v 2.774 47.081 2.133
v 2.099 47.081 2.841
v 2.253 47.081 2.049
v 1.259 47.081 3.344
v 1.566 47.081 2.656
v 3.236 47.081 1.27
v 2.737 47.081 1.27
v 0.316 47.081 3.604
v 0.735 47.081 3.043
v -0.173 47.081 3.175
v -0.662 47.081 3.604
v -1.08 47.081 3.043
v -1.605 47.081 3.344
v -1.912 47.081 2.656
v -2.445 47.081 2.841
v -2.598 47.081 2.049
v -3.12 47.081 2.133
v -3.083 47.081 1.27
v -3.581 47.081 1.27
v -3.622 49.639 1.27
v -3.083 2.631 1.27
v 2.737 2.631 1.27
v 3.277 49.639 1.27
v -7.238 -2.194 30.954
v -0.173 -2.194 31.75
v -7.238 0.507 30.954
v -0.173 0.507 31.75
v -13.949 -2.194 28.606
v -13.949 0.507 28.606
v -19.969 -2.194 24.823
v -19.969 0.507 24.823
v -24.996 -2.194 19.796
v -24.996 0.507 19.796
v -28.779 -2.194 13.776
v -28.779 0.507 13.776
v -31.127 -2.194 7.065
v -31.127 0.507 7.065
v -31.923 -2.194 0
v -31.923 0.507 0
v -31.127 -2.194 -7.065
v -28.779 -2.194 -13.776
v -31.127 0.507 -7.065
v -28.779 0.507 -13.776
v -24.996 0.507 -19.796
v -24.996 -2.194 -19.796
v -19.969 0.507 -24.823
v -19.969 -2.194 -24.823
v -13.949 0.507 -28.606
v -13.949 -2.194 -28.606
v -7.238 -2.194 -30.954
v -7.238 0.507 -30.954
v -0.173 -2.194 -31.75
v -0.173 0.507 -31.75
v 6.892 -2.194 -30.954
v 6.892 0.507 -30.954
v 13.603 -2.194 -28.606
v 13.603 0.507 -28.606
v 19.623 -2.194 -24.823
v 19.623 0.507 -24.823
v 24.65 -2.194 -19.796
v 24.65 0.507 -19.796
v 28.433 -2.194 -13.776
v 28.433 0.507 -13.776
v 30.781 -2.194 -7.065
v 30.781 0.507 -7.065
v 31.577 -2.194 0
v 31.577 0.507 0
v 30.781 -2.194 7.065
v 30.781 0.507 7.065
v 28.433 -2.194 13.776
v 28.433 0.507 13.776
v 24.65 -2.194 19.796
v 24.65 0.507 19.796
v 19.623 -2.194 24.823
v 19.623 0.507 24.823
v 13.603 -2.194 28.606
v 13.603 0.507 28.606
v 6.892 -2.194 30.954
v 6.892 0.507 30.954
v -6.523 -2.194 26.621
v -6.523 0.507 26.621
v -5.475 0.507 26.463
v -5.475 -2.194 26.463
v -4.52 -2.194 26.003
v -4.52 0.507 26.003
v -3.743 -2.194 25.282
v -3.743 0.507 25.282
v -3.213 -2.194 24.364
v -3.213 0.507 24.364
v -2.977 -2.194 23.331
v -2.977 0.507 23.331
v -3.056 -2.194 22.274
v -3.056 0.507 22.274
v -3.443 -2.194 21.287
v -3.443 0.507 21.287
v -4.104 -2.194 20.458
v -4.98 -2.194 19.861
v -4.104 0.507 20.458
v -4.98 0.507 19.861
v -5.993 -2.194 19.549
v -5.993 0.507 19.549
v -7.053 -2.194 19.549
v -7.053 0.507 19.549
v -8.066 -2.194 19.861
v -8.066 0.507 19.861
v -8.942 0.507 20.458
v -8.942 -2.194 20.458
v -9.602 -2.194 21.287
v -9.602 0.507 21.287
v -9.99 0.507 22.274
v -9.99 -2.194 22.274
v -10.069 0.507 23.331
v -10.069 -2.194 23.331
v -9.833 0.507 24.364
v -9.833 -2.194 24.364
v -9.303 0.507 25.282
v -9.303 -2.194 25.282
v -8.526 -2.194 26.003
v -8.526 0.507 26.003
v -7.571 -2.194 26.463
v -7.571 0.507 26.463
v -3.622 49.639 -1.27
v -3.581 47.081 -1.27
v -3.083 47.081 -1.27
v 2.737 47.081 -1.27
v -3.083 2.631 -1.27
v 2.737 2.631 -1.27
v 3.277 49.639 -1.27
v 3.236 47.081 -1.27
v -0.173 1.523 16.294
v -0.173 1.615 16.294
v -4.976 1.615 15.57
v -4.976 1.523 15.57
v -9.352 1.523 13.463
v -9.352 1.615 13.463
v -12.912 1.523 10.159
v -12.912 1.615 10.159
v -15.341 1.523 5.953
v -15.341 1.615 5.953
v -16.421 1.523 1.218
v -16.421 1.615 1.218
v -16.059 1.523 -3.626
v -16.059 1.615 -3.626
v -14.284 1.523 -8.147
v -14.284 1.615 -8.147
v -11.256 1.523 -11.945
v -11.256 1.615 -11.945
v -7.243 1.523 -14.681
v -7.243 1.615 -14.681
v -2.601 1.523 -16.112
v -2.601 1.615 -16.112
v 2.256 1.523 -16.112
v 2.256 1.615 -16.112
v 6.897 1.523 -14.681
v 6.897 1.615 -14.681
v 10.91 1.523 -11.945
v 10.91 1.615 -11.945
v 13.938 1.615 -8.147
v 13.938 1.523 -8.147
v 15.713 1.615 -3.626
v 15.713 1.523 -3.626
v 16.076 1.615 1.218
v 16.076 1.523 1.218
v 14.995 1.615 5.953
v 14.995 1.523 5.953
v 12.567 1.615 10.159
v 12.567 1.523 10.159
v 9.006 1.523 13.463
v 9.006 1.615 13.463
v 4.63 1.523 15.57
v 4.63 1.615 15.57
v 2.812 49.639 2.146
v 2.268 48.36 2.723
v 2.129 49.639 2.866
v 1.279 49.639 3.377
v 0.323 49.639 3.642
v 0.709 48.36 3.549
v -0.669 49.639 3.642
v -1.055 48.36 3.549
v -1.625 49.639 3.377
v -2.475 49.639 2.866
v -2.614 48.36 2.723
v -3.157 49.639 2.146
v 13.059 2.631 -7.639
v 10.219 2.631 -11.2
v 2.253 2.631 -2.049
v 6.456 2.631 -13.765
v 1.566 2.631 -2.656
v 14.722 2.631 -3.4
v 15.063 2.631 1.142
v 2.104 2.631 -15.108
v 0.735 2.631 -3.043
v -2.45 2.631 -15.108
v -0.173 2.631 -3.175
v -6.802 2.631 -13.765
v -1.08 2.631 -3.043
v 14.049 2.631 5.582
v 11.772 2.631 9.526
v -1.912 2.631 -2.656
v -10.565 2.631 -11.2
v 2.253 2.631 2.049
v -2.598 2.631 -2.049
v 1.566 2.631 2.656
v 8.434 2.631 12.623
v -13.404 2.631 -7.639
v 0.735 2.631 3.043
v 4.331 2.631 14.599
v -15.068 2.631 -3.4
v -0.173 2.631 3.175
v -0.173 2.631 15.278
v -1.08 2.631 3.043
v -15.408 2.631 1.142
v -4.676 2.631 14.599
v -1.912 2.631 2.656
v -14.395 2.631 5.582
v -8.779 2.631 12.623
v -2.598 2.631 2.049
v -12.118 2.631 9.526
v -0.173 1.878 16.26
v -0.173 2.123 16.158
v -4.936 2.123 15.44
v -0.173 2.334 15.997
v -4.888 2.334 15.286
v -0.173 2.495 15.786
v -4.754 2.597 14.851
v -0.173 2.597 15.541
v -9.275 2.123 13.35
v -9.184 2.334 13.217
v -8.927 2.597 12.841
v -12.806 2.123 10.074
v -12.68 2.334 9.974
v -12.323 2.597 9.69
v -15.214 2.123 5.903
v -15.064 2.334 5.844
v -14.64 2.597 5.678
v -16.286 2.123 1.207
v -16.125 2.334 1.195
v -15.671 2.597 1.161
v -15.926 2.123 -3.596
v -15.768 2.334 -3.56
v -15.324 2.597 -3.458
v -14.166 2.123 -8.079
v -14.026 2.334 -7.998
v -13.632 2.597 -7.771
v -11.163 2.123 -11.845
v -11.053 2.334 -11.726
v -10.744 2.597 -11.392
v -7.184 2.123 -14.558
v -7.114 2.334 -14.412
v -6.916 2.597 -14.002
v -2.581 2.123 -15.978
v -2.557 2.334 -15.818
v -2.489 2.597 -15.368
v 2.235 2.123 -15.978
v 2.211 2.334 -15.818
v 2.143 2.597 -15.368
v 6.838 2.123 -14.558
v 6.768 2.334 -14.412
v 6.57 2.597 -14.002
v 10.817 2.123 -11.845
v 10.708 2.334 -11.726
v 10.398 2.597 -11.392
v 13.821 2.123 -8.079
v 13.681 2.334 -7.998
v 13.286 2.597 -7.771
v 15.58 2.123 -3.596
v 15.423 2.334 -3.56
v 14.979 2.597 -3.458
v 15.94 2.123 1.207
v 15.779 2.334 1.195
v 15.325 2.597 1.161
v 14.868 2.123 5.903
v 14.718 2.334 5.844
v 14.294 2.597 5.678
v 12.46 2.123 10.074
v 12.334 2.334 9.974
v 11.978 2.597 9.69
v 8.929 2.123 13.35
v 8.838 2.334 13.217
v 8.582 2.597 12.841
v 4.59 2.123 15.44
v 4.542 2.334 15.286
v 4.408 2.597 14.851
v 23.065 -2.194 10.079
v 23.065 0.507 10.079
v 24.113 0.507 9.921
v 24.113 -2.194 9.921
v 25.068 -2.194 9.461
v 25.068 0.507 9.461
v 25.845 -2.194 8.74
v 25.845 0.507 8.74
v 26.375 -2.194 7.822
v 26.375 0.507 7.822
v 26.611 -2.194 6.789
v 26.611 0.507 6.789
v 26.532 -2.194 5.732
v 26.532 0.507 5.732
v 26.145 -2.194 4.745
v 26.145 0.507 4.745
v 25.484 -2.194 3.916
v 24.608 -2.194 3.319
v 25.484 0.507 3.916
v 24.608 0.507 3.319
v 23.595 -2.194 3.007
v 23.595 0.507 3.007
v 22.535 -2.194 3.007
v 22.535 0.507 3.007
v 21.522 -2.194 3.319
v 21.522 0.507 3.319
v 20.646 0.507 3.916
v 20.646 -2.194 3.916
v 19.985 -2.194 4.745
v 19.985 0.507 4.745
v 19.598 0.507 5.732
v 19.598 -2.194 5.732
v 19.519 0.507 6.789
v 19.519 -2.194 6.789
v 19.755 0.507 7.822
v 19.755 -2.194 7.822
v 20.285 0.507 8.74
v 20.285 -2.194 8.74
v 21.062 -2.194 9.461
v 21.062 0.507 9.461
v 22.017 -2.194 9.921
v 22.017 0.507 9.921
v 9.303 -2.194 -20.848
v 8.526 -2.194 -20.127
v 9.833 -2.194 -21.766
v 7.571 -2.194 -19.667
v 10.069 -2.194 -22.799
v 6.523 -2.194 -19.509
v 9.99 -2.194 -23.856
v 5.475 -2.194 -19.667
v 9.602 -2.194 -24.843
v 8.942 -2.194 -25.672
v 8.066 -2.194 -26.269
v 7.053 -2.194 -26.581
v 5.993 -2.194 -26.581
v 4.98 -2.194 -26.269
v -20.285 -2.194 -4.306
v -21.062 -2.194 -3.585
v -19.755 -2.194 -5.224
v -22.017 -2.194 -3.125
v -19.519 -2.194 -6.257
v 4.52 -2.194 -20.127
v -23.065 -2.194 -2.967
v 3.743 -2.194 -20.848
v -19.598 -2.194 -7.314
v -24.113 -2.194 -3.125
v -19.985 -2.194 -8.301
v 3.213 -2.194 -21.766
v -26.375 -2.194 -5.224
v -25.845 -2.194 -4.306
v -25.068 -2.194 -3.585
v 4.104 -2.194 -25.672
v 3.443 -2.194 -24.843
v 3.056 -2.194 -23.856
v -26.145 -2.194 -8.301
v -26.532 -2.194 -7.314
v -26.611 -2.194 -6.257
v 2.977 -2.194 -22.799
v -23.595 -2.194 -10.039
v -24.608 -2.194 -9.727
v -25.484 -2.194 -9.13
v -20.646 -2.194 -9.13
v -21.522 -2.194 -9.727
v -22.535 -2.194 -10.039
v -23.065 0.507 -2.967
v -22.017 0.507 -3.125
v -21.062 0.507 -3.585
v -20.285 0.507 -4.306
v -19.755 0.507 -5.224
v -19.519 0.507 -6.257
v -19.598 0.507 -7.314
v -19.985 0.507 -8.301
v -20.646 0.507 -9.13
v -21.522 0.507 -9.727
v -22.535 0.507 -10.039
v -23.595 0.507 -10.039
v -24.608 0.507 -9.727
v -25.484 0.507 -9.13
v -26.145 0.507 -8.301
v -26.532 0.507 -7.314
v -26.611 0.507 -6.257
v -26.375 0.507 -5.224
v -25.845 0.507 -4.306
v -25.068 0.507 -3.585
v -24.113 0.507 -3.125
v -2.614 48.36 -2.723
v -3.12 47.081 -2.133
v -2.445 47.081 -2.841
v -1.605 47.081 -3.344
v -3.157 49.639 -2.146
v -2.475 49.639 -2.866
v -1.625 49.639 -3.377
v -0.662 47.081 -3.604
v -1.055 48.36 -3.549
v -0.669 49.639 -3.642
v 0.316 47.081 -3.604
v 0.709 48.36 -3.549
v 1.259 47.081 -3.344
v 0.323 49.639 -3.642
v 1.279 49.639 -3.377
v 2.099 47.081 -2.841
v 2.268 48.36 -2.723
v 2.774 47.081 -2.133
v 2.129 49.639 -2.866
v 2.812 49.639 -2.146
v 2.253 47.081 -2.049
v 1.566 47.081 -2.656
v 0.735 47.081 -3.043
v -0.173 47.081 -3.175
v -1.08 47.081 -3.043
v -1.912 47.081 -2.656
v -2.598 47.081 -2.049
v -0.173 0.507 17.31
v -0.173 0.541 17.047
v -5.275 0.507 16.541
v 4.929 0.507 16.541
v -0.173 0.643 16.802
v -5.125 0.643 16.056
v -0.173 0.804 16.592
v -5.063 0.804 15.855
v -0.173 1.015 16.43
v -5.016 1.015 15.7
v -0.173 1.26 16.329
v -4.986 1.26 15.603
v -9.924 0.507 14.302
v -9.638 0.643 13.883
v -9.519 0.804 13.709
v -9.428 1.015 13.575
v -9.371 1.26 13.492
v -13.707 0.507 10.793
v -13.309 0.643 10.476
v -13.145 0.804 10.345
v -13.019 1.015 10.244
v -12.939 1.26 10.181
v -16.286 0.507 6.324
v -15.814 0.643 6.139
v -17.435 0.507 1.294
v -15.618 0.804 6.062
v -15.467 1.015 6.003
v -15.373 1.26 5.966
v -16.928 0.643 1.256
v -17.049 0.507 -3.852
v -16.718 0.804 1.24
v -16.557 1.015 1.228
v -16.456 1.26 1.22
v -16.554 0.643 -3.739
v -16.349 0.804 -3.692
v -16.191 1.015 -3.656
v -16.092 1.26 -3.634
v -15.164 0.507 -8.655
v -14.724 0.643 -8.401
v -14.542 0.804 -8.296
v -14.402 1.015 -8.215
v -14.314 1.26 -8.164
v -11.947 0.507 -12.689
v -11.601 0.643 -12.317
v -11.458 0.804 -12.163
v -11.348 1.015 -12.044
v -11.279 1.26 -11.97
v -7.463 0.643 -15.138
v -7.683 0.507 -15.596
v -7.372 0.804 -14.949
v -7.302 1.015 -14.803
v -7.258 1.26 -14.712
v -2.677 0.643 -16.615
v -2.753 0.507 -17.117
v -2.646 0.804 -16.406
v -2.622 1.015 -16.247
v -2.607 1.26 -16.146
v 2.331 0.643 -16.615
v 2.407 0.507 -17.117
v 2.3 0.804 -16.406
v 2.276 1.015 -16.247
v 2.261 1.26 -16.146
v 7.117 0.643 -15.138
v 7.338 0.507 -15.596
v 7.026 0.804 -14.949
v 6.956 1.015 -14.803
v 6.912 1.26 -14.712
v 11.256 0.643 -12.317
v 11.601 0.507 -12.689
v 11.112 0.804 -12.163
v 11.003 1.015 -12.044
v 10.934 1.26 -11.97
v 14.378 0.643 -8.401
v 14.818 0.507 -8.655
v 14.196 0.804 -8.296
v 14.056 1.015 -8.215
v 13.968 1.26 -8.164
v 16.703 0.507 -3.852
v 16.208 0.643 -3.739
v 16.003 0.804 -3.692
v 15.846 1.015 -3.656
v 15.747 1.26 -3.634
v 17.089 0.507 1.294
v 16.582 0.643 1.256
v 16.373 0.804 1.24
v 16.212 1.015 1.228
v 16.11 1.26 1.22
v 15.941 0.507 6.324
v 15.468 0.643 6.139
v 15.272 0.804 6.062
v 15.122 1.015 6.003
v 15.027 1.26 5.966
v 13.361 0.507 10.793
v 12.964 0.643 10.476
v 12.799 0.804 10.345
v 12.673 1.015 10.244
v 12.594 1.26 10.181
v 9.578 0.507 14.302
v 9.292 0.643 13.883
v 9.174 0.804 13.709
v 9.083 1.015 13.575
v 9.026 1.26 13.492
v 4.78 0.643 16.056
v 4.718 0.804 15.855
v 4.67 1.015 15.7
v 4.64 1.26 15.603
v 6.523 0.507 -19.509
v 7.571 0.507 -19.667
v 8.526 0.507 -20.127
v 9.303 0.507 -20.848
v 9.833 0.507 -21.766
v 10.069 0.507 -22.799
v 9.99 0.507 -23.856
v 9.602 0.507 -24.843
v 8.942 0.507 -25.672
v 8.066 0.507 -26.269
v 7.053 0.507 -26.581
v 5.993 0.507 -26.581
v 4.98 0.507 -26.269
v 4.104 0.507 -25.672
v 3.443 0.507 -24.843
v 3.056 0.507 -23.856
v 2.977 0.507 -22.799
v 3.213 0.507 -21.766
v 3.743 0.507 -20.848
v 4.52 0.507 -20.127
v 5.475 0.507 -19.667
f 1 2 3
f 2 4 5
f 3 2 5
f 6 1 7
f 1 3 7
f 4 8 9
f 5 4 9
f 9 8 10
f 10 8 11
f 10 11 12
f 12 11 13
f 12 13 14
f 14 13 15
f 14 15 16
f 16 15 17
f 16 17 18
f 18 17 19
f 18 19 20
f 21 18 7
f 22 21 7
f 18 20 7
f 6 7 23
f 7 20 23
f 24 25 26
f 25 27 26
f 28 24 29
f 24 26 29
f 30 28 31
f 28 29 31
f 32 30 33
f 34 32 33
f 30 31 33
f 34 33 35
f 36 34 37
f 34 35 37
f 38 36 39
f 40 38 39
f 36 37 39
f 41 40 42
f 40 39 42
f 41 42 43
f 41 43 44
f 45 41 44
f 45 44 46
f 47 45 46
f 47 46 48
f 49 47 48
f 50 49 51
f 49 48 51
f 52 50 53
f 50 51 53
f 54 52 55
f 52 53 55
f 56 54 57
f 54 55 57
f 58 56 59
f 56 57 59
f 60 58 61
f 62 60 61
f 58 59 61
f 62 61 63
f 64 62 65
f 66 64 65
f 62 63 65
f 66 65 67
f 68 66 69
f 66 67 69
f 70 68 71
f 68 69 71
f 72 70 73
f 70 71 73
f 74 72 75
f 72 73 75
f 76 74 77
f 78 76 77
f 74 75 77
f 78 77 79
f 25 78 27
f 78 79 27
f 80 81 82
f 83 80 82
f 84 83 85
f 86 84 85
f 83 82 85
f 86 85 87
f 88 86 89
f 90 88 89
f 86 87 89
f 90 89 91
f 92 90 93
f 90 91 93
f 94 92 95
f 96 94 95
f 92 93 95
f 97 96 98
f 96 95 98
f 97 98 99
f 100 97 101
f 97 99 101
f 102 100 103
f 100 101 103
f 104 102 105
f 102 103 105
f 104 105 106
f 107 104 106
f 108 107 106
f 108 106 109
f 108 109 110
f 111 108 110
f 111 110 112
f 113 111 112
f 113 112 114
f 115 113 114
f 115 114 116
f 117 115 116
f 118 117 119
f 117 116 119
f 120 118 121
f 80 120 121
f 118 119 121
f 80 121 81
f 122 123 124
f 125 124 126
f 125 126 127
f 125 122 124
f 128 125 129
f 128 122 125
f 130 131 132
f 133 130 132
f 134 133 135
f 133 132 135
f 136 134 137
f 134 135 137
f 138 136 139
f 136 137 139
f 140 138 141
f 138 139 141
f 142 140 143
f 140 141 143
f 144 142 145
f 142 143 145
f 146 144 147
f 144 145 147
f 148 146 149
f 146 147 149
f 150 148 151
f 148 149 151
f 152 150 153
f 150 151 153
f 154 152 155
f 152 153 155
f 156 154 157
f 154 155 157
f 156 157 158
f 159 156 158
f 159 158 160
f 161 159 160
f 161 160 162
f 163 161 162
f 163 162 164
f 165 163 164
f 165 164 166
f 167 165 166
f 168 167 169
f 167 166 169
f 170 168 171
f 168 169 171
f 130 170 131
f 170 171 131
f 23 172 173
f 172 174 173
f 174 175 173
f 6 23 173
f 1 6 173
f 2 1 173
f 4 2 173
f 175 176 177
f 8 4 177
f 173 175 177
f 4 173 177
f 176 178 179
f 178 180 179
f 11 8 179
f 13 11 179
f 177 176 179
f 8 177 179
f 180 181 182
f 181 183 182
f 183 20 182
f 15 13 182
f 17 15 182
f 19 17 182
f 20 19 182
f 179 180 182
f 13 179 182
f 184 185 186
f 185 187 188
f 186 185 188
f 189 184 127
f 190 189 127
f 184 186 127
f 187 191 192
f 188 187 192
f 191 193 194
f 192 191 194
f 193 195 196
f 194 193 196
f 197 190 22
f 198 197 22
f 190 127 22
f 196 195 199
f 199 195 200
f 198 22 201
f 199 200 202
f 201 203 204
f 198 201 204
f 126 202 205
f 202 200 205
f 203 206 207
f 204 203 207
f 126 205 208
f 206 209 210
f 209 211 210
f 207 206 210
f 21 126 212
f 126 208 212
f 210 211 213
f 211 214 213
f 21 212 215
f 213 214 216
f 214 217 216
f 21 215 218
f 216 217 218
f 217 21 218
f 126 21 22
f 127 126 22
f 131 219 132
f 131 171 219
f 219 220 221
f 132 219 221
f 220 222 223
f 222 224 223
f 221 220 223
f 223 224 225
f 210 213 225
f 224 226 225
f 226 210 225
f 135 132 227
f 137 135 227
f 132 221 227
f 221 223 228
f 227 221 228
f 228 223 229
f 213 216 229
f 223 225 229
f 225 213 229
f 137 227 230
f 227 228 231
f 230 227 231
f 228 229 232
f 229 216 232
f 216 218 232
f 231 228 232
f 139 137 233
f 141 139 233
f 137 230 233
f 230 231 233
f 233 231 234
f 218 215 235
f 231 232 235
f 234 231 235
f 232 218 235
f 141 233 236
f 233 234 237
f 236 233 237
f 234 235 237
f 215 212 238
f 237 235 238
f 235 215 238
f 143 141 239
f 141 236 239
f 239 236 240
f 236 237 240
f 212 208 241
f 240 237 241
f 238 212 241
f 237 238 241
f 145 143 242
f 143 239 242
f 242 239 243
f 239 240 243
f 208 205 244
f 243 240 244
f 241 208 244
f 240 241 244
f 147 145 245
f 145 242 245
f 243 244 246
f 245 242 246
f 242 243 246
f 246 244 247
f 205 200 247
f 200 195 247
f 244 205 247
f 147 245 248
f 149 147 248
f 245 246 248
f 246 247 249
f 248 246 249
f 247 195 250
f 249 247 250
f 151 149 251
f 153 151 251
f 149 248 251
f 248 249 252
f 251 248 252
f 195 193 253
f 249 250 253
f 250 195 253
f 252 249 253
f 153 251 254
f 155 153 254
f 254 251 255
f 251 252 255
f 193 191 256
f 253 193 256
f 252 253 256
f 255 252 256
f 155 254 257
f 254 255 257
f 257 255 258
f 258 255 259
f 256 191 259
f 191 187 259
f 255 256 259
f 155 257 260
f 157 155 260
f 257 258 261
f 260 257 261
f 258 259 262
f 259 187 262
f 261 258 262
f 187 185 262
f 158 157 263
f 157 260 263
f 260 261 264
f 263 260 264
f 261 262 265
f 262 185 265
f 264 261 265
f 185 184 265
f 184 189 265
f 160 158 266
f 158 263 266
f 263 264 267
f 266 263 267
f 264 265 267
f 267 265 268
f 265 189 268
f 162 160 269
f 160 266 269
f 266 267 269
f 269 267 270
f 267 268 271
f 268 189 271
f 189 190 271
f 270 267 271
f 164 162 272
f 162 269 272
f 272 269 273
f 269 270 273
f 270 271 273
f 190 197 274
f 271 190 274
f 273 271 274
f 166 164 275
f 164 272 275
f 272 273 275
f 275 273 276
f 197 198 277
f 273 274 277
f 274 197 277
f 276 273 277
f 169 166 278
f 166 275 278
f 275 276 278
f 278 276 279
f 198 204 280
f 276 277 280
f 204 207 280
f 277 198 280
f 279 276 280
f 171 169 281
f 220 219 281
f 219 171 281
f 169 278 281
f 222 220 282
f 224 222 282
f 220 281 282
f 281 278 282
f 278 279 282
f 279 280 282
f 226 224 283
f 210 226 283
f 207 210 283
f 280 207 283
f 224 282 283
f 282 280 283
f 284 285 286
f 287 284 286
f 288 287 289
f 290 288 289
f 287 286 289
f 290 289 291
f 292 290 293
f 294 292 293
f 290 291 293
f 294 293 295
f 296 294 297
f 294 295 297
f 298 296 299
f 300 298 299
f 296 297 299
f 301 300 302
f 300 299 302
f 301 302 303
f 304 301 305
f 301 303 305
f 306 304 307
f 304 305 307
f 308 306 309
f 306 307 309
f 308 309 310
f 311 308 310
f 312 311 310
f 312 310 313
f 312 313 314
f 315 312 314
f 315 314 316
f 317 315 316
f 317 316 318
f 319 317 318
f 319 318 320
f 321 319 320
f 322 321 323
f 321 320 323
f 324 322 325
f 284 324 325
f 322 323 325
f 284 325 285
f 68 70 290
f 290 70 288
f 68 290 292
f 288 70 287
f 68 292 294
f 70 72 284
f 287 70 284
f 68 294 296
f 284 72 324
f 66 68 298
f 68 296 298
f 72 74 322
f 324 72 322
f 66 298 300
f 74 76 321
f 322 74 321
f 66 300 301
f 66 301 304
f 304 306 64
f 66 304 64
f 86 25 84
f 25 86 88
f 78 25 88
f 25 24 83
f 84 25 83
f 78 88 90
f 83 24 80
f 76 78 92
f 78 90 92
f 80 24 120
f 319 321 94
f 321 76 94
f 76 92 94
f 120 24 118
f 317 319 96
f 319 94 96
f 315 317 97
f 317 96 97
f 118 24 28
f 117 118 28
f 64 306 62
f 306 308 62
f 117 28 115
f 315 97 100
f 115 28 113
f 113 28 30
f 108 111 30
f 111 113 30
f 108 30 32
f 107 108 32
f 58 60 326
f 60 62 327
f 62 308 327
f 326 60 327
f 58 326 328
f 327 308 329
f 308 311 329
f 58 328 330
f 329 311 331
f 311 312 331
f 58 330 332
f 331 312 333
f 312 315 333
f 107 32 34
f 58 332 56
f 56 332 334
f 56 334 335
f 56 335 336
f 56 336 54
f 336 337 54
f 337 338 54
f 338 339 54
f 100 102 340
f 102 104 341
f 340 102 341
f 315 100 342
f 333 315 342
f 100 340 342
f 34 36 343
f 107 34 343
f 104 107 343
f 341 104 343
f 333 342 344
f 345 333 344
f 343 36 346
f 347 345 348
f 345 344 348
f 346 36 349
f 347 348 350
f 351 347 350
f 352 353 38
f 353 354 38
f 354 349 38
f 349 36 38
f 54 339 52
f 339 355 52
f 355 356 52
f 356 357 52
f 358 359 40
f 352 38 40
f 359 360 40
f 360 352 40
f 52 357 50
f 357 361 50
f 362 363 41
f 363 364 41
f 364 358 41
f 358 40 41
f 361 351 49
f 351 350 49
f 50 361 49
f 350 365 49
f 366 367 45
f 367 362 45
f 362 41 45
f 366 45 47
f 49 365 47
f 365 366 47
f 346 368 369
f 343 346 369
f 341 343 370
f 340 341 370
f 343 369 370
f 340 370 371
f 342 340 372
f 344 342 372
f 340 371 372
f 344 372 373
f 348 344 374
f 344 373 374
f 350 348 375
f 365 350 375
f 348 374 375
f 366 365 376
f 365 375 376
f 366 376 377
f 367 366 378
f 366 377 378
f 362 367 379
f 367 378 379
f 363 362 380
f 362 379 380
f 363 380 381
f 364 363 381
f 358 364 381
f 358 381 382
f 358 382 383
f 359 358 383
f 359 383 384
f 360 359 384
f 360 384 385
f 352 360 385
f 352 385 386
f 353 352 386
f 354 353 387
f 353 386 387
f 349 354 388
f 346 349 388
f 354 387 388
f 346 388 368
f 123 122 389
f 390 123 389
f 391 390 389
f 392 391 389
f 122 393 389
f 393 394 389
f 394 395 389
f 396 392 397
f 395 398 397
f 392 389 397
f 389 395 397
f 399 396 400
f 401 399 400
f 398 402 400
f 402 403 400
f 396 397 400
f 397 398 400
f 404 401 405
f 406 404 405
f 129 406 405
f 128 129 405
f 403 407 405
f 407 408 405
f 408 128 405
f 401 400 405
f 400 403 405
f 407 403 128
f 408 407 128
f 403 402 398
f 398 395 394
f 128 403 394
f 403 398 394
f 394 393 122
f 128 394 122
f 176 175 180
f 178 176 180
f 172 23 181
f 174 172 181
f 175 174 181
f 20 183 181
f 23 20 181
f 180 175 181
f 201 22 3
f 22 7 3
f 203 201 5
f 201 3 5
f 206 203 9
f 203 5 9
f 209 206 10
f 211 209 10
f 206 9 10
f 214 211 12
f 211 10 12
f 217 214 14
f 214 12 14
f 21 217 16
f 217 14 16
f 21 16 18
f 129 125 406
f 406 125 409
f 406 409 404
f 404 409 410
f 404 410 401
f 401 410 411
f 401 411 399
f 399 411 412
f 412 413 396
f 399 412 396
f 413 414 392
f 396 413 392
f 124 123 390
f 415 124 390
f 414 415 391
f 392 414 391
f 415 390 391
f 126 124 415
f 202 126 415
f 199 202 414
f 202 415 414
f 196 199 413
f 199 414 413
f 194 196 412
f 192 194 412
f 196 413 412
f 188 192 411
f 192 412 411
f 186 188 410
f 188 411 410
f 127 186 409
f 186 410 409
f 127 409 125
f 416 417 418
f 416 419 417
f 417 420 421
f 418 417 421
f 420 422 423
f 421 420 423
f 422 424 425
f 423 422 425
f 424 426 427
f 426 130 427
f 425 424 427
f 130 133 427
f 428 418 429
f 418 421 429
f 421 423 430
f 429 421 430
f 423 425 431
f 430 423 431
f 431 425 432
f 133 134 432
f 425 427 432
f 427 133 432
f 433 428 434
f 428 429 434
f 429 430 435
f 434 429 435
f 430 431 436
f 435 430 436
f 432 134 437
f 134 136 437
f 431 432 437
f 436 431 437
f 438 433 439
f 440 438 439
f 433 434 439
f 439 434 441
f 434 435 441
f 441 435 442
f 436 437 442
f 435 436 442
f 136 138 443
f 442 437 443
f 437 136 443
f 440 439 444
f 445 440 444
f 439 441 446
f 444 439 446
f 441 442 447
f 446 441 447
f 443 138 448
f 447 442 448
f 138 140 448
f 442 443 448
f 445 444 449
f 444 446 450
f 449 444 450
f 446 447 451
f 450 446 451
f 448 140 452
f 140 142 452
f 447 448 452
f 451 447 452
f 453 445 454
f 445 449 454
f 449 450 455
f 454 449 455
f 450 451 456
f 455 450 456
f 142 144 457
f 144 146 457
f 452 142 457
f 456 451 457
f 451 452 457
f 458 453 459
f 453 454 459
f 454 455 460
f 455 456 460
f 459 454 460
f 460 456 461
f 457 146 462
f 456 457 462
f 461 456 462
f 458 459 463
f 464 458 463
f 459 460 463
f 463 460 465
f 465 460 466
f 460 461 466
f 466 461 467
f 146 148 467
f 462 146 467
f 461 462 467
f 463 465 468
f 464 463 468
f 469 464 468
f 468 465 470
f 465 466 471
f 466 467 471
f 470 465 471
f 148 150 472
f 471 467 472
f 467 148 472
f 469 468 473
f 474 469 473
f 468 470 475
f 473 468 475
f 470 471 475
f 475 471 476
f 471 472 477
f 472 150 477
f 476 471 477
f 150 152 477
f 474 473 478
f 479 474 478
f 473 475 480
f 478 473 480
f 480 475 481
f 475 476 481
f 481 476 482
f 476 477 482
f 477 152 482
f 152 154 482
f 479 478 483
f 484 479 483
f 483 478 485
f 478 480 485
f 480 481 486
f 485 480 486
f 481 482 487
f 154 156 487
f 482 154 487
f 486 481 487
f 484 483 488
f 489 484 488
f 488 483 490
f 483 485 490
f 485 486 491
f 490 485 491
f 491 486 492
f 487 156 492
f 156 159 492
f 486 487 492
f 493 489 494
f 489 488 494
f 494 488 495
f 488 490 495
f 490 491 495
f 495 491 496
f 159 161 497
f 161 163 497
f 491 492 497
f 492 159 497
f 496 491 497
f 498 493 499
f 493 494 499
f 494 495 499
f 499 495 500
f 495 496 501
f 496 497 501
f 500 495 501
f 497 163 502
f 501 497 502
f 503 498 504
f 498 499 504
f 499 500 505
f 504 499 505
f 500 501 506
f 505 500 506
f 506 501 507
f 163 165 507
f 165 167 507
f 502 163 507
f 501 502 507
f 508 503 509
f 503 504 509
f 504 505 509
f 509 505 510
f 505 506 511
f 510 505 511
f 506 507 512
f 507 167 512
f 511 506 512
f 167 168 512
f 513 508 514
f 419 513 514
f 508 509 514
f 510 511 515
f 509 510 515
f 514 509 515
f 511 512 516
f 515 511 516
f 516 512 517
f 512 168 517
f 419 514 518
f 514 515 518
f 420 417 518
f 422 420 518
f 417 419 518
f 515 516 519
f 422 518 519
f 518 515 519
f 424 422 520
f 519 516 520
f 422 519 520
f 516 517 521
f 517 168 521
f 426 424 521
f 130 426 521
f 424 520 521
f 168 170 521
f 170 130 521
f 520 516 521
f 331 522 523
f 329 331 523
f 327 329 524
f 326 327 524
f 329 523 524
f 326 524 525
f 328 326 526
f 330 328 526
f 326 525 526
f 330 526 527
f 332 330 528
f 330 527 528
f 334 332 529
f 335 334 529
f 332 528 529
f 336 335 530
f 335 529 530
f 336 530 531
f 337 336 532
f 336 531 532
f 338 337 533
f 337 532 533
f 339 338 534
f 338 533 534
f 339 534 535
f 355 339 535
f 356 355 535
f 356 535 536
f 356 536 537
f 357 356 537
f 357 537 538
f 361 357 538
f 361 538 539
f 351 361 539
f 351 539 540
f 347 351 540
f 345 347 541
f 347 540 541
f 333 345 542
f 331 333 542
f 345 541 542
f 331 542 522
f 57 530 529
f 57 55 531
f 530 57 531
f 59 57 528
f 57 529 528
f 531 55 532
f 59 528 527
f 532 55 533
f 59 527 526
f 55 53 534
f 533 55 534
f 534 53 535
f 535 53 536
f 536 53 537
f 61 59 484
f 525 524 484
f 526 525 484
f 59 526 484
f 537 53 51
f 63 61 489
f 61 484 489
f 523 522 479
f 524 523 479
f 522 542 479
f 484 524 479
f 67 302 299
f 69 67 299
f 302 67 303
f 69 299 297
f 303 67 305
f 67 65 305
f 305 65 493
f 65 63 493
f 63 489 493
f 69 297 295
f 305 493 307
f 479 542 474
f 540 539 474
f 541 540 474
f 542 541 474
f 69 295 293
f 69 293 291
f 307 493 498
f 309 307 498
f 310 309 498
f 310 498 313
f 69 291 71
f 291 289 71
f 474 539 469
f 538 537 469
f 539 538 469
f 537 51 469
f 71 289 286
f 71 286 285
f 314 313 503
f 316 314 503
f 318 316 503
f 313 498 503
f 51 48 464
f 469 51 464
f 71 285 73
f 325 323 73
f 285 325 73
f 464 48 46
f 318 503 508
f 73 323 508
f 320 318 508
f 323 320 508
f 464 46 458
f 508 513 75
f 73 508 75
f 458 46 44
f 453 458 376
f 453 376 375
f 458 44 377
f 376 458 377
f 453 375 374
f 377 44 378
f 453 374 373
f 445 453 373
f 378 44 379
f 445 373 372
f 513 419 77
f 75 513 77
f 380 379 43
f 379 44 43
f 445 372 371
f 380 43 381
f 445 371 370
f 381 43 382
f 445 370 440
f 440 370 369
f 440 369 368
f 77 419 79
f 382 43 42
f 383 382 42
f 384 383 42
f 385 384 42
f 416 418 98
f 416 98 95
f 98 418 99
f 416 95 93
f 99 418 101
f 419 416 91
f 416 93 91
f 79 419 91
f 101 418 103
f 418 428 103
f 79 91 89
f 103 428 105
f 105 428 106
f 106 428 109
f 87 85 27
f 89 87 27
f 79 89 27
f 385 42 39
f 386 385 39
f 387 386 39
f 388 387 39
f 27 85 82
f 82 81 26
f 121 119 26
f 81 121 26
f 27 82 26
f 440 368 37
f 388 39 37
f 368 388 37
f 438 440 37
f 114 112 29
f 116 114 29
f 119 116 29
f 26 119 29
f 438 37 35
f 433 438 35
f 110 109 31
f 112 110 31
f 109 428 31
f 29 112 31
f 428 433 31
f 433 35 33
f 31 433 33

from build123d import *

# Parameters (mm, degrees)
FILLET1_R          = 1.016
SKETCH5_R          = 3.556
CUT_EXTRUDE4_DEPTH = 2.701148395
SKETCH9_W          = 105.570120157
SKETCH9_H          = 128.790829306
CUT_EXTRUDE5_DEPTH = 1.27


with BuildPart() as part:
    # Sketch1 → Revolve1 (revolve)
    with BuildSketch(Plane.XY, mode=Mode.PRIVATE) as revolve1_sk:
        Polygon((-0.172820682, 49.639122622), (-0.172820682, 0.012009488), (-0.172820682, -2.194330865), (31.577179318, -2.194330865), (31.577179318, 0.506817529), (16.121405897, 0.506817529), (16.121405897, 2.63143161), (3.002179318, 2.63143161), (3.002179318, 47.08143161), (3.46467558, 47.08143161), (3.503063095, 49.639122622), align=None)
    revolve(revolve1_sk.sketch.rotate(Axis((-0.172820682, 49.639122622, 0), (0, -1, 0)), 90), axis=Axis((-0.172820682, 49.639122622, 0), (0, -1, 0)))

    # Fillet1
    fillet1_edges = [part.edges().sort_by_distance(p)[0] for p in [
        (-0.172820682, 0.506817529, -16.294226579),
        (-0.172820682, 2.63143161, -16.294226579),
    ]]
    fillet(fillet1_edges, radius=FILLET1_R)

    # Sketch5 → Cut-Extrude4 (cut)
    with BuildSketch(Plane(origin=(0, 0.506817529, 0), x_dir=(1, 0, 0), z_dir=(0, 1, 0))):
        with Locations(Location((-23.064919044, 6.522820682, 0), (0, 0, 270))):
            Circle(SKETCH5_R)
        with Locations(Location((6.522820682, 23.064919044, 0), (0, 0, 270))):
            Circle(SKETCH5_R)
        with Locations(Location((23.064919044, -6.522820682, 0), (0, 0, 270))):
            Circle(SKETCH5_R)
        with Locations(Location((-6.522820682, -23.064919044, 0), (0, 0, 270))):
            Circle(SKETCH5_R)
    extrude(amount=-CUT_EXTRUDE4_DEPTH, mode=Mode.SUBTRACT)

    # Sketch9 → Cut-Extrude5 (cut, symmetric)
    with BuildSketch(Plane.XY):
        with Locations((-17.353763652, 67.026846263)):
            Rectangle(SKETCH9_W, SKETCH9_H)
    extrude(amount=CUT_EXTRUDE5_DEPTH, both=True, mode=Mode.SUBTRACT)


solid = part.part
